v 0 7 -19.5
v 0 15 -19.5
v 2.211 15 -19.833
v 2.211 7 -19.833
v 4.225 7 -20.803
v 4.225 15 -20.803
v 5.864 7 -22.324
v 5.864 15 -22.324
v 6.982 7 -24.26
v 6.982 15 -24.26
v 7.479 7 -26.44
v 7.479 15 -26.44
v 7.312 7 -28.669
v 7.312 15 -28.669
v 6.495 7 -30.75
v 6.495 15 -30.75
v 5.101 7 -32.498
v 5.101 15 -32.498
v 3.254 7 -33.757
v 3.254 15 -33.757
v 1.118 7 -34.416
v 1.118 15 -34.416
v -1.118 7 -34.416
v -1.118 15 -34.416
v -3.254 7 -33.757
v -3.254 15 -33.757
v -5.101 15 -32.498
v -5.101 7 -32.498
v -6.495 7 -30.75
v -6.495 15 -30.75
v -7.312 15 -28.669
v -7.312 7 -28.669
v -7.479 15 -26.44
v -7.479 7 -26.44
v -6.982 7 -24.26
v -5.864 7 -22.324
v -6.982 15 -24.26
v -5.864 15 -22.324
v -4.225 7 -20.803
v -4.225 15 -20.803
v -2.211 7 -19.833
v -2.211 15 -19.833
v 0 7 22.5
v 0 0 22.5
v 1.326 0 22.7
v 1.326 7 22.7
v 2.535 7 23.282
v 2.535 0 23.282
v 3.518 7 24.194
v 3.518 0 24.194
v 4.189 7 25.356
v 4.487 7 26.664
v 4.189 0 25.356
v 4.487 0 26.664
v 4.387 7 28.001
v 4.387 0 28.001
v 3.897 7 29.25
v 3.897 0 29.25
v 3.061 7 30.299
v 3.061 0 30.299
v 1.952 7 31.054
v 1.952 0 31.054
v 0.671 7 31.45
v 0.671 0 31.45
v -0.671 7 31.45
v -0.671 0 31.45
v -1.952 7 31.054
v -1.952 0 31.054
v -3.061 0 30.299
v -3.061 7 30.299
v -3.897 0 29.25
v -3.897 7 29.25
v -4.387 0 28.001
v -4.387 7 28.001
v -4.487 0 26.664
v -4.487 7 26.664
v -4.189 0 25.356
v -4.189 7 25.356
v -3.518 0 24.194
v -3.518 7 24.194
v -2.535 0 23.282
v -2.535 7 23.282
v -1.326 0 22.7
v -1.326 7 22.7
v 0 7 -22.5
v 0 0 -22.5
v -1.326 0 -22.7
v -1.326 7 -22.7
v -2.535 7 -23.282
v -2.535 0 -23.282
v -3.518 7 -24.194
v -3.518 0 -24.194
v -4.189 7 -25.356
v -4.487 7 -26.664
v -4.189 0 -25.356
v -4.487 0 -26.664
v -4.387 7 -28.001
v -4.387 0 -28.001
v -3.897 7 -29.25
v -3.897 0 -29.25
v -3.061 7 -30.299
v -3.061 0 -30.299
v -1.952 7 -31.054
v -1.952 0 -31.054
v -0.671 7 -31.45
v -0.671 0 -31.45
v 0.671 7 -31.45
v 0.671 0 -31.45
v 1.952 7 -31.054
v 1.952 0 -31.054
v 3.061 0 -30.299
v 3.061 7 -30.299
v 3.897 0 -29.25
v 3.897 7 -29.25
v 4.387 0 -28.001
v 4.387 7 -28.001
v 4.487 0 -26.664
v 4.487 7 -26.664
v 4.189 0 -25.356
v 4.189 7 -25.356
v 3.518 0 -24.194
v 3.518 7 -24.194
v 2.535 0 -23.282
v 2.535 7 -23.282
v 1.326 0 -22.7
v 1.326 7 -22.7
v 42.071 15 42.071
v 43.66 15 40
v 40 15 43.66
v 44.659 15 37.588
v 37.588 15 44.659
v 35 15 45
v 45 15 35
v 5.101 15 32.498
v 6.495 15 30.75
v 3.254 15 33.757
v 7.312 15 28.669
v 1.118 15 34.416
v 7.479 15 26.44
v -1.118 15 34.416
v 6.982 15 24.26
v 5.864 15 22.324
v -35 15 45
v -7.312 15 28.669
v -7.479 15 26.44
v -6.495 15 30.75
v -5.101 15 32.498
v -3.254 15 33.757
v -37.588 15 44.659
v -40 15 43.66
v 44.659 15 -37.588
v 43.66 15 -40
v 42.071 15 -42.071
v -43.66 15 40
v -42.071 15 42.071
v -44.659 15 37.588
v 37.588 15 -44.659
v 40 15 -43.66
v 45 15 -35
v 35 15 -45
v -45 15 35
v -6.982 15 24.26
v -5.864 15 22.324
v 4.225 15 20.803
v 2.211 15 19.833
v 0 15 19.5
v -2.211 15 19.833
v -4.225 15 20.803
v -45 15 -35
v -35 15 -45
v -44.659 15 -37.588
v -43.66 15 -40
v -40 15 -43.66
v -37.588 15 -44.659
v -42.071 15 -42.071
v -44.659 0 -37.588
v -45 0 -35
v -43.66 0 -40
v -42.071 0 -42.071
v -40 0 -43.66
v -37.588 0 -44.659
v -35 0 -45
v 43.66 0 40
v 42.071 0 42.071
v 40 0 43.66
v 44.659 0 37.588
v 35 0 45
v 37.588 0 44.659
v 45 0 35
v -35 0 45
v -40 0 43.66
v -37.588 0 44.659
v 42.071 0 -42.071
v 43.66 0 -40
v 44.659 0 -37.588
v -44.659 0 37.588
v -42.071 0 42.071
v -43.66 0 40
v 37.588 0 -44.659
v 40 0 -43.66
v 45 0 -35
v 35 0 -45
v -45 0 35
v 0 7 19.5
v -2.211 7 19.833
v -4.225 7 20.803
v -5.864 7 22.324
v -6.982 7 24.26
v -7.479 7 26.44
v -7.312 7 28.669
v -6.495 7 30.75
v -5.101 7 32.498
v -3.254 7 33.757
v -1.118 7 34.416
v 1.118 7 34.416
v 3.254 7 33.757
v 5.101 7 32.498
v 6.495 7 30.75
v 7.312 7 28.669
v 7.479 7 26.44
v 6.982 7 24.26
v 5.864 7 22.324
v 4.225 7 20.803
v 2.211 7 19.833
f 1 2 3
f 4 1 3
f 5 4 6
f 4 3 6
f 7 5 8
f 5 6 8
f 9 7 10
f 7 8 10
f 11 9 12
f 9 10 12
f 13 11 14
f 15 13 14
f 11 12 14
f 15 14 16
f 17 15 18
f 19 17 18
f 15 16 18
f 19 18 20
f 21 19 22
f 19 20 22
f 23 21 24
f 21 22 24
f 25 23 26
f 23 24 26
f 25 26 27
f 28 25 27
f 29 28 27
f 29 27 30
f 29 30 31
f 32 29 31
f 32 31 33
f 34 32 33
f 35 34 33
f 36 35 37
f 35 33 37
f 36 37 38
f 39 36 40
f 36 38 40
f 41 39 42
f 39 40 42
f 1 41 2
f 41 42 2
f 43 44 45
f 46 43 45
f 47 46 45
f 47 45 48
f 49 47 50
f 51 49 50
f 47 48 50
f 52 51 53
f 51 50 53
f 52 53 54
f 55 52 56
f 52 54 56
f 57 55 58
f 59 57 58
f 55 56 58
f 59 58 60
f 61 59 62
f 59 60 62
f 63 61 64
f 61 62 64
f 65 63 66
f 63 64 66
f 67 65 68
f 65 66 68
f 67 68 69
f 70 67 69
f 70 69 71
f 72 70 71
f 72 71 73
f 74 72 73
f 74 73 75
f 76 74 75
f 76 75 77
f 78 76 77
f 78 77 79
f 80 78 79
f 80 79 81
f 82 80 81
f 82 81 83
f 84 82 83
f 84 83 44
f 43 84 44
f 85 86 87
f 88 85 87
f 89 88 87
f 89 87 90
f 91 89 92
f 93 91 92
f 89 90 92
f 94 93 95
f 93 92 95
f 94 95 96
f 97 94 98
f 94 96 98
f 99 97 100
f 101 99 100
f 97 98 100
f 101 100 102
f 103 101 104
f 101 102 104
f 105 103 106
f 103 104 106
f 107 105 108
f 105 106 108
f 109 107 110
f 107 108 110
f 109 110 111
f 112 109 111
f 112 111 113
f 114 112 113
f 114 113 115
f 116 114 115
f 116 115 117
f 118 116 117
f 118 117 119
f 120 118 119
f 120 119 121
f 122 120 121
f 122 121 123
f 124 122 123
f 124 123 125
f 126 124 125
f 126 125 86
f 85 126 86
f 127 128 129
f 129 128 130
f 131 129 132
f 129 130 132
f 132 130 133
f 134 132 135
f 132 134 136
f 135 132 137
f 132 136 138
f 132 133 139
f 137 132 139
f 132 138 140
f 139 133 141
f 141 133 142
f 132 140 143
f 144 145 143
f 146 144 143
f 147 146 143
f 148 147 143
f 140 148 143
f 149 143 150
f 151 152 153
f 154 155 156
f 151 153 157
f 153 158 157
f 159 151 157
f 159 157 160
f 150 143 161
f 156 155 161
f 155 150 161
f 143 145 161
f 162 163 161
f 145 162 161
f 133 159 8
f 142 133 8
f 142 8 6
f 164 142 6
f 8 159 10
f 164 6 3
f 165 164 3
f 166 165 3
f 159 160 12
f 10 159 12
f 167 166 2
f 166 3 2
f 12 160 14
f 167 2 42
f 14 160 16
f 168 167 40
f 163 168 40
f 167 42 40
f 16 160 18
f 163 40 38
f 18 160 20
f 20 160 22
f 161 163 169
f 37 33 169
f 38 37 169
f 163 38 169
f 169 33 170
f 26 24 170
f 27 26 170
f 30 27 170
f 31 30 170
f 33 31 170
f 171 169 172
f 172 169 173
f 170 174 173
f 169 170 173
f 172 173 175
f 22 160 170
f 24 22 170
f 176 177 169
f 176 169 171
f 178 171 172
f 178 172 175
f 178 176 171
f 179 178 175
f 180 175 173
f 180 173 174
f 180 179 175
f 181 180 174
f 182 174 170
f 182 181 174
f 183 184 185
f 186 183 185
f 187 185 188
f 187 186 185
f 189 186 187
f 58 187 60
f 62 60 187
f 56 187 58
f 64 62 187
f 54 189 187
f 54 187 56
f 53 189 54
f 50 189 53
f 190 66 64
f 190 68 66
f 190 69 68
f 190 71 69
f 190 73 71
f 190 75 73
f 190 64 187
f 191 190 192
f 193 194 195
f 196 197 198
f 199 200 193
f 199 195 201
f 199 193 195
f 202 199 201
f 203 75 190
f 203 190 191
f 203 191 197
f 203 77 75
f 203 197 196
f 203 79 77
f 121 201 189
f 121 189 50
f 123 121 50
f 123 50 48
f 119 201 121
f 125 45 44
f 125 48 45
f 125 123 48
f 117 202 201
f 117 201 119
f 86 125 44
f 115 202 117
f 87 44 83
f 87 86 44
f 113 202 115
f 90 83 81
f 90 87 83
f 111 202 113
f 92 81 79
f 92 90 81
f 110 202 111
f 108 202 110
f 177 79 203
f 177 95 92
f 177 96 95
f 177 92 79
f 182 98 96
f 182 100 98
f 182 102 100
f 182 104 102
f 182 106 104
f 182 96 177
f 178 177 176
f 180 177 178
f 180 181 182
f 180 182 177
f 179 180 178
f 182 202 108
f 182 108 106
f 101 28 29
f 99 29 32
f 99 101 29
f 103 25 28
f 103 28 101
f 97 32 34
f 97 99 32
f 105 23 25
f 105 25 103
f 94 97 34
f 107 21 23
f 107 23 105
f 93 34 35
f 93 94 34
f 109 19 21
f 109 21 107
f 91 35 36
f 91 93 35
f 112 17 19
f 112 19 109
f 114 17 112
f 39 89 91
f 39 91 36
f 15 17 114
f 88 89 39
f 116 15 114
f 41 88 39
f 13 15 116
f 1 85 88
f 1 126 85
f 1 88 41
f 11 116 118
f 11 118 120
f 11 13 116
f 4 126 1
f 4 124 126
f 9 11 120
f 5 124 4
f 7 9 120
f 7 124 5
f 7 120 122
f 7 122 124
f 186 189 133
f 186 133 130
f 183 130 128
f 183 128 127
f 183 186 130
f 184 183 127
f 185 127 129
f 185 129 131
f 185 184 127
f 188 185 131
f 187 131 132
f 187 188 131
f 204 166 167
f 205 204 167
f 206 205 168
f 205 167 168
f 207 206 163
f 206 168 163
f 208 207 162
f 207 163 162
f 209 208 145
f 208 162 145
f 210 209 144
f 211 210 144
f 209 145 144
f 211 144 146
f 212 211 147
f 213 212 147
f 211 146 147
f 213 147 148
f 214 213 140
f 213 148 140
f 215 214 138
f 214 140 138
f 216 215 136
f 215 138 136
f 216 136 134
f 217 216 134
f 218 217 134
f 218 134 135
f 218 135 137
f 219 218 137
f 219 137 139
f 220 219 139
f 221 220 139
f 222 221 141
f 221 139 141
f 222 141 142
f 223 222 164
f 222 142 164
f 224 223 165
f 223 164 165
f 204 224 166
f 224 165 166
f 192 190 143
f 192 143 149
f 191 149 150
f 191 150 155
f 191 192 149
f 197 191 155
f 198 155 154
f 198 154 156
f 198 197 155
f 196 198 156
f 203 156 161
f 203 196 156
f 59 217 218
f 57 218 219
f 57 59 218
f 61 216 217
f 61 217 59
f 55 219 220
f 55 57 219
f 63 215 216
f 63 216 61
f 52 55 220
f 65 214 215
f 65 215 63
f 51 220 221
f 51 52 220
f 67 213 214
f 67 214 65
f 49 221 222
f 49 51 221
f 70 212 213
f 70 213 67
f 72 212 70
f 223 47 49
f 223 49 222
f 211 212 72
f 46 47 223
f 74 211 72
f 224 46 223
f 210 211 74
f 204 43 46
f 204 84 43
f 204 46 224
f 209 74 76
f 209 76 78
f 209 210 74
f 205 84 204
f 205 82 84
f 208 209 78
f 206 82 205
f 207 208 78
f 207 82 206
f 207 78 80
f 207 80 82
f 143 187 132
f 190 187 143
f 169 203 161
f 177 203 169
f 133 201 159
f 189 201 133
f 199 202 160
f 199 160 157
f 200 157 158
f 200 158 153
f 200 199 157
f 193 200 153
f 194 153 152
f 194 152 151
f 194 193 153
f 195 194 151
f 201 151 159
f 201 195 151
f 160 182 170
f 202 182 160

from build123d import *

# Parameters (mm, degrees)
EXTRUDE_2_DEPTH     = 15
SKETCH_3_R          = 7.5
CUT_EXTRUDE_1_DEPTH = 8
SKETCH_4_R          = 4.5
CUT_EXTRUDE_2_DEPTH = 66.383484153


with BuildPart() as part:
    # 草图2 → 凸台-拉伸2 (new body)
    with BuildSketch(Plane(origin=(0, 0, 0), x_dir=(1, 0, 0), z_dir=(0, 1, 0))):
        with BuildLine():
            Line((-35, 45), (35, 45))
            ThreePointArc((35, 45), (42.071067812, 42.071067812), (45, 35))
            Line((45, 35), (45, -35))
            ThreePointArc((45, -35), (42.071067812, -42.071067812), (35, -45))
            Line((35, -45), (-35, -45))
            ThreePointArc((-35, -45), (-42.071067812, -42.071067812), (-45, -35))
            Line((-45, -35), (-45, 35))
            ThreePointArc((-45, 35), (-42.071067812, 42.071067812), (-35, 45))
        make_face()
    extrude(amount=EXTRUDE_2_DEPTH)

    # 草图3 → 切除-拉伸1 (cut)
    with BuildSketch(Plane(origin=(0, 15, 0), x_dir=(1, 0, 0), z_dir=(0, 1, 0))):
        with Locations(Location((0, 27, 0), (0, 0, 270))):
            Circle(SKETCH_3_R)
        with Locations(Location((0, -27, 0), (0, 0, 90))):
            Circle(SKETCH_3_R)
    extrude(amount=-CUT_EXTRUDE_1_DEPTH, mode=Mode.SUBTRACT)

    # 草图4 → 切除-拉伸2 (cut, through all)
    with BuildSketch(Plane.XZ):
        with Locations(Location((0, 27, 0), (0, 0, 270))):
            Circle(SKETCH_4_R)
        with Locations(Location((0, -27, 0), (0, 0, 90))):
            Circle(SKETCH_4_R)
    extrude(amount=-CUT_EXTRUDE_2_DEPTH, mode=Mode.SUBTRACT)


solid = part.part
